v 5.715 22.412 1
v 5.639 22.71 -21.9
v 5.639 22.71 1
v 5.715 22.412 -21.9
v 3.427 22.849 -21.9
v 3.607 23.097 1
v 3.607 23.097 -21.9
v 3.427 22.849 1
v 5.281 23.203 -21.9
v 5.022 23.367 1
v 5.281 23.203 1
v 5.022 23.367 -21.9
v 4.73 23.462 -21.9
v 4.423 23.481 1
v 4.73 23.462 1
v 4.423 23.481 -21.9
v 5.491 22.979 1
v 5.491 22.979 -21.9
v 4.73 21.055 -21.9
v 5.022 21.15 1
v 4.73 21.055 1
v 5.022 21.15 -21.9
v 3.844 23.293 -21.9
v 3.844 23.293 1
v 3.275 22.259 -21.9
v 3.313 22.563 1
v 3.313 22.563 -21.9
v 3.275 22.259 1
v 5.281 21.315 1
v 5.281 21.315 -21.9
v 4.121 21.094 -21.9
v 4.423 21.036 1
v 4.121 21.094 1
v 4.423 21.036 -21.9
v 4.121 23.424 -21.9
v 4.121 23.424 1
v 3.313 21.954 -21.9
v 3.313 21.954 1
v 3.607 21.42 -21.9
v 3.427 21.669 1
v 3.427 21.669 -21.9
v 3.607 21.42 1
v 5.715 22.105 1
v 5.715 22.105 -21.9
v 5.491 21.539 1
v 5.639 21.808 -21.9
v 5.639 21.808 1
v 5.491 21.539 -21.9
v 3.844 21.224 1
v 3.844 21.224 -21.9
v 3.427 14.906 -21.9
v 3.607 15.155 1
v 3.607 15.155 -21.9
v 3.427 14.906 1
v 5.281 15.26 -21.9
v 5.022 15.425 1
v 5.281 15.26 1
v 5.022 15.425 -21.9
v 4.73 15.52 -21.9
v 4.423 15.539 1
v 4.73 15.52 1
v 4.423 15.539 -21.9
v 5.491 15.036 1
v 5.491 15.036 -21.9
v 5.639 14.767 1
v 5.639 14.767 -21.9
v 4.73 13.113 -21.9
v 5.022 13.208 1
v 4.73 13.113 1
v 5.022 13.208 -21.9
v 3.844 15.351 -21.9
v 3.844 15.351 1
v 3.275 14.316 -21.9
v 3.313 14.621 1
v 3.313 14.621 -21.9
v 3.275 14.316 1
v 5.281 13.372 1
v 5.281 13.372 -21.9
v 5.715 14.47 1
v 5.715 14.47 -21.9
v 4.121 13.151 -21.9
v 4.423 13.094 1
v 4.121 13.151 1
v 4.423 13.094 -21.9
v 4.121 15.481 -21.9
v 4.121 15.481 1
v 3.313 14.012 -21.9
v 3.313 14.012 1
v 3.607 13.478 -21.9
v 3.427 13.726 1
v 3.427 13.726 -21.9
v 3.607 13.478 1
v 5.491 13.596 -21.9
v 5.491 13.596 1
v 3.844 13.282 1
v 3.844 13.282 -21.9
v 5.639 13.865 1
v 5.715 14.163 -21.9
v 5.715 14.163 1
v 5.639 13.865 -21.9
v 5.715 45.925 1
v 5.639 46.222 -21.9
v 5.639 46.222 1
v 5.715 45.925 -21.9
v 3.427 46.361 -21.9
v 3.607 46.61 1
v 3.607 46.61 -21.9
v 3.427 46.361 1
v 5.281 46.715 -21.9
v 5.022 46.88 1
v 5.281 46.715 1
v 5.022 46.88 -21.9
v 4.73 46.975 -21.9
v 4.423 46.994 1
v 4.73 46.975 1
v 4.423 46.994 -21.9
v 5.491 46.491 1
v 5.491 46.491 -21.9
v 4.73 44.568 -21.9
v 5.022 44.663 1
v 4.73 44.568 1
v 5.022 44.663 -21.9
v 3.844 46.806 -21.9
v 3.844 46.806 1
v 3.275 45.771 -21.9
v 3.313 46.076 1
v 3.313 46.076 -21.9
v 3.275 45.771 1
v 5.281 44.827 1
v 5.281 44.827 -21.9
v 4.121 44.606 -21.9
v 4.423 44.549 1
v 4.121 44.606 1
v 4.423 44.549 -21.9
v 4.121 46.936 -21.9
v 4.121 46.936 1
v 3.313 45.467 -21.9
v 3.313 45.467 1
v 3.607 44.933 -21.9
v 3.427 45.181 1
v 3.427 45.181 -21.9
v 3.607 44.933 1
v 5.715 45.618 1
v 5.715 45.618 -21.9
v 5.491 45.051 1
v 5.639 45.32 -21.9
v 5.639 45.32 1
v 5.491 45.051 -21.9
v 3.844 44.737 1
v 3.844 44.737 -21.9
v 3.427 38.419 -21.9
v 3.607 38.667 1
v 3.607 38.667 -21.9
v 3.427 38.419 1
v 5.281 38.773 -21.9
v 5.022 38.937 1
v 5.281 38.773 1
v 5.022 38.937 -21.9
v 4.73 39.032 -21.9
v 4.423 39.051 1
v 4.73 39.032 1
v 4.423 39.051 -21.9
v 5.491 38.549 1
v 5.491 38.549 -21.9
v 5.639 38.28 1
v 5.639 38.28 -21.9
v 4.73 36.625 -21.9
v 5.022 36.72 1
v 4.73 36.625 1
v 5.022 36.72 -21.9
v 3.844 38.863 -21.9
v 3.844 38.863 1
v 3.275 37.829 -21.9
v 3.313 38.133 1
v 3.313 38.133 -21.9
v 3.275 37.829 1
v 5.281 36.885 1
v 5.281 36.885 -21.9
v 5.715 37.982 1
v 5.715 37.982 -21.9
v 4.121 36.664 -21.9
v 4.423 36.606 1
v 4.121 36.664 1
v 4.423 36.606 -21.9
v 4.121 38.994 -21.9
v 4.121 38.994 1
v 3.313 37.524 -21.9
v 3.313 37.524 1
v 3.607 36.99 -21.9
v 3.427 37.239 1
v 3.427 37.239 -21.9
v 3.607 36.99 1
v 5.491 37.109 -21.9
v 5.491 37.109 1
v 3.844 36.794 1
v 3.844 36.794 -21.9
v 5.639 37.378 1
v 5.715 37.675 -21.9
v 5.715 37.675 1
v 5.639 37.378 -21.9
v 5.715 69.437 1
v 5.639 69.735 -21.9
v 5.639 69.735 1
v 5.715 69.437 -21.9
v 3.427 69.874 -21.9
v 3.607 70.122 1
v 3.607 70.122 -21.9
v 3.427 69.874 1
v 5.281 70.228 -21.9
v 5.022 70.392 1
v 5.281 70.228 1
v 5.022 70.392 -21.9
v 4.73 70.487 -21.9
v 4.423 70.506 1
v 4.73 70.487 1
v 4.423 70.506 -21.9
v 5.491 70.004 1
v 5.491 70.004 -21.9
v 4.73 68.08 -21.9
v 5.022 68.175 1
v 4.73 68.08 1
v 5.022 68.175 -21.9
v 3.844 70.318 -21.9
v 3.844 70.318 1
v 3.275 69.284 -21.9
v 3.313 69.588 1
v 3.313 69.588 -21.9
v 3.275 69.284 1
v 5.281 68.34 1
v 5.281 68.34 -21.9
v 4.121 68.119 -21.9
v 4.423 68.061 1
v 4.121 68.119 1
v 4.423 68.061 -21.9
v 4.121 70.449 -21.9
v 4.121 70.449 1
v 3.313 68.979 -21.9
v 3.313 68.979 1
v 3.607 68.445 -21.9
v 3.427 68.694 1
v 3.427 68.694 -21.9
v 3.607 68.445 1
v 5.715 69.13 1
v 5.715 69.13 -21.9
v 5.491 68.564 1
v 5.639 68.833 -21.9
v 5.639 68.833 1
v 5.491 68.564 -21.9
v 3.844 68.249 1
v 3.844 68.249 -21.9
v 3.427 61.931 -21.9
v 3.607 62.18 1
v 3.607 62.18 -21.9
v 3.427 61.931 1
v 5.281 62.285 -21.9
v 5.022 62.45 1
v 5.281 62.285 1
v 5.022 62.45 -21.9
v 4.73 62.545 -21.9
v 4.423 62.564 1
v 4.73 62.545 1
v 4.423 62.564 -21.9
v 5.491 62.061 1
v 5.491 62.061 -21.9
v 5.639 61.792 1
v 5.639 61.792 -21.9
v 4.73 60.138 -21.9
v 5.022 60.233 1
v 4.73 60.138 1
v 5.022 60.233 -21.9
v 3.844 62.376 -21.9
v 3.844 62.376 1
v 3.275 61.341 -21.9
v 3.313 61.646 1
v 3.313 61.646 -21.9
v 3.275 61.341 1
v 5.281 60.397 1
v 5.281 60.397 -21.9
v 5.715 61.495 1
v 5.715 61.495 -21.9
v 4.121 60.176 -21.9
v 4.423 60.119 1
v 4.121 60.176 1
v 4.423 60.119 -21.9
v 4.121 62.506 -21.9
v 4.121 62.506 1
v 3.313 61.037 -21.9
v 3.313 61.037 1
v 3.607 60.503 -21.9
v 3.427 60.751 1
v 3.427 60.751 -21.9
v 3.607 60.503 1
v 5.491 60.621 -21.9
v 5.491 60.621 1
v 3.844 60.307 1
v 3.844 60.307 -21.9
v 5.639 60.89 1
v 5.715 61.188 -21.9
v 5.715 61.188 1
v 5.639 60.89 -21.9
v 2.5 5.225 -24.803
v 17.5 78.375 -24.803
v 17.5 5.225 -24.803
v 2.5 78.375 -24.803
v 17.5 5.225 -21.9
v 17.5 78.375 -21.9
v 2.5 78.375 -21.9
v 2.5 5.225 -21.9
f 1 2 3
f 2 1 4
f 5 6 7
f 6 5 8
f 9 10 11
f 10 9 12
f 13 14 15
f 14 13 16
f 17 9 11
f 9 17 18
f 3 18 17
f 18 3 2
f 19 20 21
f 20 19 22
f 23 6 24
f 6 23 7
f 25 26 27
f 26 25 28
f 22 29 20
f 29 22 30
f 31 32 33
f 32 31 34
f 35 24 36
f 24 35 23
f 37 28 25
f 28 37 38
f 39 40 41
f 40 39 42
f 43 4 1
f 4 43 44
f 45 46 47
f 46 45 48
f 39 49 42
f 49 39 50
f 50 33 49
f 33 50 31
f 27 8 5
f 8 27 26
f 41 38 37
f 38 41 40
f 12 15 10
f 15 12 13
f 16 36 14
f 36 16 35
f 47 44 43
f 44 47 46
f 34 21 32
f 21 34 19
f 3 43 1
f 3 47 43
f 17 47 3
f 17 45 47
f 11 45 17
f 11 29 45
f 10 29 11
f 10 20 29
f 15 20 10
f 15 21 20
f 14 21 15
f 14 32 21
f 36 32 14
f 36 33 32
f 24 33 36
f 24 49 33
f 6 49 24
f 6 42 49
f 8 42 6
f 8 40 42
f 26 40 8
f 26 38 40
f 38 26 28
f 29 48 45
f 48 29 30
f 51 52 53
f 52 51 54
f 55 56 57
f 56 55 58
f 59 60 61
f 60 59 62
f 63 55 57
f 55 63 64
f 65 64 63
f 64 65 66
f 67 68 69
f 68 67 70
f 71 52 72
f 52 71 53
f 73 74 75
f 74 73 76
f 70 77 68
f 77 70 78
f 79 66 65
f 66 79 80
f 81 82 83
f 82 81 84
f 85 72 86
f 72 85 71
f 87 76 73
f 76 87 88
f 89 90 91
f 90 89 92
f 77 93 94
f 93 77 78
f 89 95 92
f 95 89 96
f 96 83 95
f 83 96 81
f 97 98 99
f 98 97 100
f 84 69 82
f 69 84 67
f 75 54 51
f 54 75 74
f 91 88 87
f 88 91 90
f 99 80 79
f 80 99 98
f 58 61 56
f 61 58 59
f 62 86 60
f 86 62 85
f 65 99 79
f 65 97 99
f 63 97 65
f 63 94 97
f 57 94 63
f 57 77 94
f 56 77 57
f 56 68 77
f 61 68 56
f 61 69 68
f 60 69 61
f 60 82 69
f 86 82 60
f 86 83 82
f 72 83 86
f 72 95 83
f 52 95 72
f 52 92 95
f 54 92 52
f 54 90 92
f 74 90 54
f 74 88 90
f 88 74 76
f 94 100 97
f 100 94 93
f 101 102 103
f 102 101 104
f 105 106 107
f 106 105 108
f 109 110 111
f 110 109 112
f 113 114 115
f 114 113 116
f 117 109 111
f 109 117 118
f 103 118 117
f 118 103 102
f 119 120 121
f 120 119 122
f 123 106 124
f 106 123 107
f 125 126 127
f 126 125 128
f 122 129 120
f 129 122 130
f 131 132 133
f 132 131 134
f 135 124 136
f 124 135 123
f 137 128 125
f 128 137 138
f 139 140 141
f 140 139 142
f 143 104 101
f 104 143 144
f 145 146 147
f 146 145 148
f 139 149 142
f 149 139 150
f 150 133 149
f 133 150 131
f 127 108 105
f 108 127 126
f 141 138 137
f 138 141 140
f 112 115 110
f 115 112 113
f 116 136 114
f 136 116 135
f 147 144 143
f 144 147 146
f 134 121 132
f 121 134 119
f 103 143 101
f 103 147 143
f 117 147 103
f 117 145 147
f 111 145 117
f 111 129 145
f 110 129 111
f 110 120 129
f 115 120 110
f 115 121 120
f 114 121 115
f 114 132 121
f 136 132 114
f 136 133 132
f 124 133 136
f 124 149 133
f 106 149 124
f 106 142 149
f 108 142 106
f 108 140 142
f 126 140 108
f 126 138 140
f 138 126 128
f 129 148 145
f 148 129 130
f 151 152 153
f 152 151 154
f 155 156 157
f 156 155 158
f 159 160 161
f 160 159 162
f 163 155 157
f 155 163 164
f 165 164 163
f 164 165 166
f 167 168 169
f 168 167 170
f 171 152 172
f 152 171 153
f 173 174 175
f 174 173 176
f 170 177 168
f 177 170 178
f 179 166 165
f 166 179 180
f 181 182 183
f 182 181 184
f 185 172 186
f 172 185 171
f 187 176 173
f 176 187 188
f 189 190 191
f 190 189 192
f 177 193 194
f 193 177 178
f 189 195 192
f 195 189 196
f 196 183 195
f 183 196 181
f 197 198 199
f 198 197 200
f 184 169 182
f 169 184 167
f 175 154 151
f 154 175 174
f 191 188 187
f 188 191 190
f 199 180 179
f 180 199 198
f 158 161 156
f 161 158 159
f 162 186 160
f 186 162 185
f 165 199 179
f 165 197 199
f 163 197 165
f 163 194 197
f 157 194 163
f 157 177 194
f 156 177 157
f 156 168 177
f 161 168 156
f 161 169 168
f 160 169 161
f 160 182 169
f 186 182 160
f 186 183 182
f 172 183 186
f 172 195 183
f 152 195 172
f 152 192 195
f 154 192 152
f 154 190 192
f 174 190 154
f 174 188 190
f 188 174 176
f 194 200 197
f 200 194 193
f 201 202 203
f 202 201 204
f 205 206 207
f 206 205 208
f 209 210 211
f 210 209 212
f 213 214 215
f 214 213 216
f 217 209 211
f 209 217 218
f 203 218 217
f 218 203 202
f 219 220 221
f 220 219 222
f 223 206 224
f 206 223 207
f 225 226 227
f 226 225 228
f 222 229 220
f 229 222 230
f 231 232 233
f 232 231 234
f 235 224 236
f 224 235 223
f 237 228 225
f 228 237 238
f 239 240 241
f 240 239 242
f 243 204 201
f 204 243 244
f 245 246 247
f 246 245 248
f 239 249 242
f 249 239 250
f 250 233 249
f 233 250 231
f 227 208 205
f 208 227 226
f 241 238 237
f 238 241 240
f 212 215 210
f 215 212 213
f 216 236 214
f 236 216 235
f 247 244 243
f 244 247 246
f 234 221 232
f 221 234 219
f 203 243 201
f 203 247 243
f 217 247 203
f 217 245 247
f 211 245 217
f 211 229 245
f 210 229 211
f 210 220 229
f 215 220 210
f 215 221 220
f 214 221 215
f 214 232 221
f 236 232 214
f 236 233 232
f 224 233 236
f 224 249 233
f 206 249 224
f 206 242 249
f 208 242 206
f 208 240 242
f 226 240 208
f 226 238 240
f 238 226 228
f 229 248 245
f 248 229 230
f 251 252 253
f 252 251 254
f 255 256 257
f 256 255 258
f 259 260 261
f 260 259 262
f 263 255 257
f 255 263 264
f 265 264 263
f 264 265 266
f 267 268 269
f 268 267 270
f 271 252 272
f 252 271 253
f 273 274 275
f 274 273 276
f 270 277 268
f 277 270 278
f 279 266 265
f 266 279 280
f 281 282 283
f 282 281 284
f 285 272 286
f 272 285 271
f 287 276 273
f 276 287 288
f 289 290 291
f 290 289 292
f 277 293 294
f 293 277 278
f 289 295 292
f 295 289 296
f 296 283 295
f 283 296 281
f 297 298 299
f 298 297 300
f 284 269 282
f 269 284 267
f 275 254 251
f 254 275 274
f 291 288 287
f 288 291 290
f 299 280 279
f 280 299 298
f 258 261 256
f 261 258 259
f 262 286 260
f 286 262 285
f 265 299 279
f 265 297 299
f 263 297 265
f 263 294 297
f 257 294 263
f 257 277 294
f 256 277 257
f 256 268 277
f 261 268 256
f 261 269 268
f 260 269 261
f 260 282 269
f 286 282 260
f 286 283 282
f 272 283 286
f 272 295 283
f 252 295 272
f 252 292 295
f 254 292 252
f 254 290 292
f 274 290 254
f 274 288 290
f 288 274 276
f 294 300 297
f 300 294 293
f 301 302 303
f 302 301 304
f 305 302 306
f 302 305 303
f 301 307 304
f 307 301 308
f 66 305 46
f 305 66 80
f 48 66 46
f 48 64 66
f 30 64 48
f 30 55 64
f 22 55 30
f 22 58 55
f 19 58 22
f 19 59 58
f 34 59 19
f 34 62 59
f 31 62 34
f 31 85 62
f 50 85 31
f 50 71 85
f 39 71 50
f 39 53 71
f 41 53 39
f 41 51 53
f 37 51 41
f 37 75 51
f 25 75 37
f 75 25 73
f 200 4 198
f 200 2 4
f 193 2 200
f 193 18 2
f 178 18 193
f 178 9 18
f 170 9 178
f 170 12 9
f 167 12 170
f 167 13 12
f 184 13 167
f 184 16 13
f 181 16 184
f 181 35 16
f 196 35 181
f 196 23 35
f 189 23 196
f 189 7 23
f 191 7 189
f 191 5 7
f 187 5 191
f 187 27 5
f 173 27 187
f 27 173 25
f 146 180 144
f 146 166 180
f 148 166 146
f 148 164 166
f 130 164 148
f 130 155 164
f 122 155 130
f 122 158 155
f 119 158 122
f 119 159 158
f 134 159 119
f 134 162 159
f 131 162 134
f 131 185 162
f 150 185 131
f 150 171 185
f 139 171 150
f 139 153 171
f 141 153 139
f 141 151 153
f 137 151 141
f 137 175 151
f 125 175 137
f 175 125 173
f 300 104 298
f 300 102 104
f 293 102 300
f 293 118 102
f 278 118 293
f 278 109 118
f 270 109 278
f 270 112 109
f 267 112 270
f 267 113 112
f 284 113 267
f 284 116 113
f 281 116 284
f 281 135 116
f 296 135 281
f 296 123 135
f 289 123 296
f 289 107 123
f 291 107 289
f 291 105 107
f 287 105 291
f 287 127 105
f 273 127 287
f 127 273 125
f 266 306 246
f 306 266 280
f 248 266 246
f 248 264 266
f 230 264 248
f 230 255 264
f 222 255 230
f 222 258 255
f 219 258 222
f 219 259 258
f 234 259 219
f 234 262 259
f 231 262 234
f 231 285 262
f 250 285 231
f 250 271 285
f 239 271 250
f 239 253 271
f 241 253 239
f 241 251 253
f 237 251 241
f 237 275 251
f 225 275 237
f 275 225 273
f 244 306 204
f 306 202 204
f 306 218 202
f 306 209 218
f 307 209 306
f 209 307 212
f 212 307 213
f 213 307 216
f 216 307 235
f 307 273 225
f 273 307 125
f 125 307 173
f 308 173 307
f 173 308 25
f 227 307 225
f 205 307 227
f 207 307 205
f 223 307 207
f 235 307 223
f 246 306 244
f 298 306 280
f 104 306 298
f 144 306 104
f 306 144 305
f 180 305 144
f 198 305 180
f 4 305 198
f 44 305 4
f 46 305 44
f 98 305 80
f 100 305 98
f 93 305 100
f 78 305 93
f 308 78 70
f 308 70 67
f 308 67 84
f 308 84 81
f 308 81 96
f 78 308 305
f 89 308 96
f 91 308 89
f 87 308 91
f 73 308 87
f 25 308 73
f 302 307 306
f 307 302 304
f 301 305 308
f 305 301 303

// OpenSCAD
// in mm (no need for conversions)

// in mm (no need for conversions)

cyl_faces=25;

sol_radius=10.45/2;
//sol_radius=12/2;
sol_hole=(2.45/2)+.2;
sol_delta=(5.33/2)+sol_radius/4;

sol_plate_x=sol_radius*5.5;
sol_plate_y=sol_radius*2*8;
sol_plate_z=5;

pinch_plate_x=sol_plate_z;
pinch_plate_y=sol_plate_y;
pinch_plate_z=sol_plate_x*1.2;

groove_x=sol_radius/1.5;
groove_y=sol_radius*10;
groove_z=sol_plate_z*3;

pinch_hole=3.84/2;
pinch_delta=(5.84+sol_radius)/2;

rod_hole=5.2/2;

//rotate([0,0,0]){
rotate([0,90,0]){
translate([1,0,0]){
color("SteelBlue",.5){
	difference(){
	// solenoid holder
		union(){
			//holder plate
			translate([sol_radius*4,sol_radius,sol_plate_z/2])
						{cube([groove_x/1.2,groove_y*1.4,groove_z]);}
			//holder rods
			for (i=[3.5,8,12.5]){
				translate([-2,sol_radius*(i),sol_plate_z-.5]){
					union(){
						// right rod
						translate([0,sol_delta,0])
							{rotate([0,90,0]){cylinder(h=sol_radius*4+groove_x/2+2,r=sol_hole-.2,$fn=cyl_faces);}}
						//left rod
						translate([0,-sol_delta,0])
							{rotate([0,90,0]){cylinder(h=sol_radius*4+groove_x/2+2,r=sol_hole-.2,$fn=cyl_faces);}}
					}}}
				
				//holder holes
//				for (i=[3.5,8,12.5]){
//					translate([-2,sol_radius*(i),sol_plate_z-.5]){
//						union(){
							// right rod
//							translate([sol_radius*3.5,sol_delta,0])
//								{rotate([0,90,0]){cylinder(h=5,r=sol_hole*2,$fn=cyl_faces);}}
							//left rod
//							translate([sol_radius*3.5,-sol_delta,0])
//								{rotate([0,90,0]){cylinder(h=5,r=sol_hole*2,$fn=cyl_faces);}}
//						}}}
			
			}

		//cleaver plate
		translate([0,sol_radius,-groove_z+sol_plate_z/2])
					{cube([groove_x*20,groove_y*1.5,groove_z]);}
		}

}}}
